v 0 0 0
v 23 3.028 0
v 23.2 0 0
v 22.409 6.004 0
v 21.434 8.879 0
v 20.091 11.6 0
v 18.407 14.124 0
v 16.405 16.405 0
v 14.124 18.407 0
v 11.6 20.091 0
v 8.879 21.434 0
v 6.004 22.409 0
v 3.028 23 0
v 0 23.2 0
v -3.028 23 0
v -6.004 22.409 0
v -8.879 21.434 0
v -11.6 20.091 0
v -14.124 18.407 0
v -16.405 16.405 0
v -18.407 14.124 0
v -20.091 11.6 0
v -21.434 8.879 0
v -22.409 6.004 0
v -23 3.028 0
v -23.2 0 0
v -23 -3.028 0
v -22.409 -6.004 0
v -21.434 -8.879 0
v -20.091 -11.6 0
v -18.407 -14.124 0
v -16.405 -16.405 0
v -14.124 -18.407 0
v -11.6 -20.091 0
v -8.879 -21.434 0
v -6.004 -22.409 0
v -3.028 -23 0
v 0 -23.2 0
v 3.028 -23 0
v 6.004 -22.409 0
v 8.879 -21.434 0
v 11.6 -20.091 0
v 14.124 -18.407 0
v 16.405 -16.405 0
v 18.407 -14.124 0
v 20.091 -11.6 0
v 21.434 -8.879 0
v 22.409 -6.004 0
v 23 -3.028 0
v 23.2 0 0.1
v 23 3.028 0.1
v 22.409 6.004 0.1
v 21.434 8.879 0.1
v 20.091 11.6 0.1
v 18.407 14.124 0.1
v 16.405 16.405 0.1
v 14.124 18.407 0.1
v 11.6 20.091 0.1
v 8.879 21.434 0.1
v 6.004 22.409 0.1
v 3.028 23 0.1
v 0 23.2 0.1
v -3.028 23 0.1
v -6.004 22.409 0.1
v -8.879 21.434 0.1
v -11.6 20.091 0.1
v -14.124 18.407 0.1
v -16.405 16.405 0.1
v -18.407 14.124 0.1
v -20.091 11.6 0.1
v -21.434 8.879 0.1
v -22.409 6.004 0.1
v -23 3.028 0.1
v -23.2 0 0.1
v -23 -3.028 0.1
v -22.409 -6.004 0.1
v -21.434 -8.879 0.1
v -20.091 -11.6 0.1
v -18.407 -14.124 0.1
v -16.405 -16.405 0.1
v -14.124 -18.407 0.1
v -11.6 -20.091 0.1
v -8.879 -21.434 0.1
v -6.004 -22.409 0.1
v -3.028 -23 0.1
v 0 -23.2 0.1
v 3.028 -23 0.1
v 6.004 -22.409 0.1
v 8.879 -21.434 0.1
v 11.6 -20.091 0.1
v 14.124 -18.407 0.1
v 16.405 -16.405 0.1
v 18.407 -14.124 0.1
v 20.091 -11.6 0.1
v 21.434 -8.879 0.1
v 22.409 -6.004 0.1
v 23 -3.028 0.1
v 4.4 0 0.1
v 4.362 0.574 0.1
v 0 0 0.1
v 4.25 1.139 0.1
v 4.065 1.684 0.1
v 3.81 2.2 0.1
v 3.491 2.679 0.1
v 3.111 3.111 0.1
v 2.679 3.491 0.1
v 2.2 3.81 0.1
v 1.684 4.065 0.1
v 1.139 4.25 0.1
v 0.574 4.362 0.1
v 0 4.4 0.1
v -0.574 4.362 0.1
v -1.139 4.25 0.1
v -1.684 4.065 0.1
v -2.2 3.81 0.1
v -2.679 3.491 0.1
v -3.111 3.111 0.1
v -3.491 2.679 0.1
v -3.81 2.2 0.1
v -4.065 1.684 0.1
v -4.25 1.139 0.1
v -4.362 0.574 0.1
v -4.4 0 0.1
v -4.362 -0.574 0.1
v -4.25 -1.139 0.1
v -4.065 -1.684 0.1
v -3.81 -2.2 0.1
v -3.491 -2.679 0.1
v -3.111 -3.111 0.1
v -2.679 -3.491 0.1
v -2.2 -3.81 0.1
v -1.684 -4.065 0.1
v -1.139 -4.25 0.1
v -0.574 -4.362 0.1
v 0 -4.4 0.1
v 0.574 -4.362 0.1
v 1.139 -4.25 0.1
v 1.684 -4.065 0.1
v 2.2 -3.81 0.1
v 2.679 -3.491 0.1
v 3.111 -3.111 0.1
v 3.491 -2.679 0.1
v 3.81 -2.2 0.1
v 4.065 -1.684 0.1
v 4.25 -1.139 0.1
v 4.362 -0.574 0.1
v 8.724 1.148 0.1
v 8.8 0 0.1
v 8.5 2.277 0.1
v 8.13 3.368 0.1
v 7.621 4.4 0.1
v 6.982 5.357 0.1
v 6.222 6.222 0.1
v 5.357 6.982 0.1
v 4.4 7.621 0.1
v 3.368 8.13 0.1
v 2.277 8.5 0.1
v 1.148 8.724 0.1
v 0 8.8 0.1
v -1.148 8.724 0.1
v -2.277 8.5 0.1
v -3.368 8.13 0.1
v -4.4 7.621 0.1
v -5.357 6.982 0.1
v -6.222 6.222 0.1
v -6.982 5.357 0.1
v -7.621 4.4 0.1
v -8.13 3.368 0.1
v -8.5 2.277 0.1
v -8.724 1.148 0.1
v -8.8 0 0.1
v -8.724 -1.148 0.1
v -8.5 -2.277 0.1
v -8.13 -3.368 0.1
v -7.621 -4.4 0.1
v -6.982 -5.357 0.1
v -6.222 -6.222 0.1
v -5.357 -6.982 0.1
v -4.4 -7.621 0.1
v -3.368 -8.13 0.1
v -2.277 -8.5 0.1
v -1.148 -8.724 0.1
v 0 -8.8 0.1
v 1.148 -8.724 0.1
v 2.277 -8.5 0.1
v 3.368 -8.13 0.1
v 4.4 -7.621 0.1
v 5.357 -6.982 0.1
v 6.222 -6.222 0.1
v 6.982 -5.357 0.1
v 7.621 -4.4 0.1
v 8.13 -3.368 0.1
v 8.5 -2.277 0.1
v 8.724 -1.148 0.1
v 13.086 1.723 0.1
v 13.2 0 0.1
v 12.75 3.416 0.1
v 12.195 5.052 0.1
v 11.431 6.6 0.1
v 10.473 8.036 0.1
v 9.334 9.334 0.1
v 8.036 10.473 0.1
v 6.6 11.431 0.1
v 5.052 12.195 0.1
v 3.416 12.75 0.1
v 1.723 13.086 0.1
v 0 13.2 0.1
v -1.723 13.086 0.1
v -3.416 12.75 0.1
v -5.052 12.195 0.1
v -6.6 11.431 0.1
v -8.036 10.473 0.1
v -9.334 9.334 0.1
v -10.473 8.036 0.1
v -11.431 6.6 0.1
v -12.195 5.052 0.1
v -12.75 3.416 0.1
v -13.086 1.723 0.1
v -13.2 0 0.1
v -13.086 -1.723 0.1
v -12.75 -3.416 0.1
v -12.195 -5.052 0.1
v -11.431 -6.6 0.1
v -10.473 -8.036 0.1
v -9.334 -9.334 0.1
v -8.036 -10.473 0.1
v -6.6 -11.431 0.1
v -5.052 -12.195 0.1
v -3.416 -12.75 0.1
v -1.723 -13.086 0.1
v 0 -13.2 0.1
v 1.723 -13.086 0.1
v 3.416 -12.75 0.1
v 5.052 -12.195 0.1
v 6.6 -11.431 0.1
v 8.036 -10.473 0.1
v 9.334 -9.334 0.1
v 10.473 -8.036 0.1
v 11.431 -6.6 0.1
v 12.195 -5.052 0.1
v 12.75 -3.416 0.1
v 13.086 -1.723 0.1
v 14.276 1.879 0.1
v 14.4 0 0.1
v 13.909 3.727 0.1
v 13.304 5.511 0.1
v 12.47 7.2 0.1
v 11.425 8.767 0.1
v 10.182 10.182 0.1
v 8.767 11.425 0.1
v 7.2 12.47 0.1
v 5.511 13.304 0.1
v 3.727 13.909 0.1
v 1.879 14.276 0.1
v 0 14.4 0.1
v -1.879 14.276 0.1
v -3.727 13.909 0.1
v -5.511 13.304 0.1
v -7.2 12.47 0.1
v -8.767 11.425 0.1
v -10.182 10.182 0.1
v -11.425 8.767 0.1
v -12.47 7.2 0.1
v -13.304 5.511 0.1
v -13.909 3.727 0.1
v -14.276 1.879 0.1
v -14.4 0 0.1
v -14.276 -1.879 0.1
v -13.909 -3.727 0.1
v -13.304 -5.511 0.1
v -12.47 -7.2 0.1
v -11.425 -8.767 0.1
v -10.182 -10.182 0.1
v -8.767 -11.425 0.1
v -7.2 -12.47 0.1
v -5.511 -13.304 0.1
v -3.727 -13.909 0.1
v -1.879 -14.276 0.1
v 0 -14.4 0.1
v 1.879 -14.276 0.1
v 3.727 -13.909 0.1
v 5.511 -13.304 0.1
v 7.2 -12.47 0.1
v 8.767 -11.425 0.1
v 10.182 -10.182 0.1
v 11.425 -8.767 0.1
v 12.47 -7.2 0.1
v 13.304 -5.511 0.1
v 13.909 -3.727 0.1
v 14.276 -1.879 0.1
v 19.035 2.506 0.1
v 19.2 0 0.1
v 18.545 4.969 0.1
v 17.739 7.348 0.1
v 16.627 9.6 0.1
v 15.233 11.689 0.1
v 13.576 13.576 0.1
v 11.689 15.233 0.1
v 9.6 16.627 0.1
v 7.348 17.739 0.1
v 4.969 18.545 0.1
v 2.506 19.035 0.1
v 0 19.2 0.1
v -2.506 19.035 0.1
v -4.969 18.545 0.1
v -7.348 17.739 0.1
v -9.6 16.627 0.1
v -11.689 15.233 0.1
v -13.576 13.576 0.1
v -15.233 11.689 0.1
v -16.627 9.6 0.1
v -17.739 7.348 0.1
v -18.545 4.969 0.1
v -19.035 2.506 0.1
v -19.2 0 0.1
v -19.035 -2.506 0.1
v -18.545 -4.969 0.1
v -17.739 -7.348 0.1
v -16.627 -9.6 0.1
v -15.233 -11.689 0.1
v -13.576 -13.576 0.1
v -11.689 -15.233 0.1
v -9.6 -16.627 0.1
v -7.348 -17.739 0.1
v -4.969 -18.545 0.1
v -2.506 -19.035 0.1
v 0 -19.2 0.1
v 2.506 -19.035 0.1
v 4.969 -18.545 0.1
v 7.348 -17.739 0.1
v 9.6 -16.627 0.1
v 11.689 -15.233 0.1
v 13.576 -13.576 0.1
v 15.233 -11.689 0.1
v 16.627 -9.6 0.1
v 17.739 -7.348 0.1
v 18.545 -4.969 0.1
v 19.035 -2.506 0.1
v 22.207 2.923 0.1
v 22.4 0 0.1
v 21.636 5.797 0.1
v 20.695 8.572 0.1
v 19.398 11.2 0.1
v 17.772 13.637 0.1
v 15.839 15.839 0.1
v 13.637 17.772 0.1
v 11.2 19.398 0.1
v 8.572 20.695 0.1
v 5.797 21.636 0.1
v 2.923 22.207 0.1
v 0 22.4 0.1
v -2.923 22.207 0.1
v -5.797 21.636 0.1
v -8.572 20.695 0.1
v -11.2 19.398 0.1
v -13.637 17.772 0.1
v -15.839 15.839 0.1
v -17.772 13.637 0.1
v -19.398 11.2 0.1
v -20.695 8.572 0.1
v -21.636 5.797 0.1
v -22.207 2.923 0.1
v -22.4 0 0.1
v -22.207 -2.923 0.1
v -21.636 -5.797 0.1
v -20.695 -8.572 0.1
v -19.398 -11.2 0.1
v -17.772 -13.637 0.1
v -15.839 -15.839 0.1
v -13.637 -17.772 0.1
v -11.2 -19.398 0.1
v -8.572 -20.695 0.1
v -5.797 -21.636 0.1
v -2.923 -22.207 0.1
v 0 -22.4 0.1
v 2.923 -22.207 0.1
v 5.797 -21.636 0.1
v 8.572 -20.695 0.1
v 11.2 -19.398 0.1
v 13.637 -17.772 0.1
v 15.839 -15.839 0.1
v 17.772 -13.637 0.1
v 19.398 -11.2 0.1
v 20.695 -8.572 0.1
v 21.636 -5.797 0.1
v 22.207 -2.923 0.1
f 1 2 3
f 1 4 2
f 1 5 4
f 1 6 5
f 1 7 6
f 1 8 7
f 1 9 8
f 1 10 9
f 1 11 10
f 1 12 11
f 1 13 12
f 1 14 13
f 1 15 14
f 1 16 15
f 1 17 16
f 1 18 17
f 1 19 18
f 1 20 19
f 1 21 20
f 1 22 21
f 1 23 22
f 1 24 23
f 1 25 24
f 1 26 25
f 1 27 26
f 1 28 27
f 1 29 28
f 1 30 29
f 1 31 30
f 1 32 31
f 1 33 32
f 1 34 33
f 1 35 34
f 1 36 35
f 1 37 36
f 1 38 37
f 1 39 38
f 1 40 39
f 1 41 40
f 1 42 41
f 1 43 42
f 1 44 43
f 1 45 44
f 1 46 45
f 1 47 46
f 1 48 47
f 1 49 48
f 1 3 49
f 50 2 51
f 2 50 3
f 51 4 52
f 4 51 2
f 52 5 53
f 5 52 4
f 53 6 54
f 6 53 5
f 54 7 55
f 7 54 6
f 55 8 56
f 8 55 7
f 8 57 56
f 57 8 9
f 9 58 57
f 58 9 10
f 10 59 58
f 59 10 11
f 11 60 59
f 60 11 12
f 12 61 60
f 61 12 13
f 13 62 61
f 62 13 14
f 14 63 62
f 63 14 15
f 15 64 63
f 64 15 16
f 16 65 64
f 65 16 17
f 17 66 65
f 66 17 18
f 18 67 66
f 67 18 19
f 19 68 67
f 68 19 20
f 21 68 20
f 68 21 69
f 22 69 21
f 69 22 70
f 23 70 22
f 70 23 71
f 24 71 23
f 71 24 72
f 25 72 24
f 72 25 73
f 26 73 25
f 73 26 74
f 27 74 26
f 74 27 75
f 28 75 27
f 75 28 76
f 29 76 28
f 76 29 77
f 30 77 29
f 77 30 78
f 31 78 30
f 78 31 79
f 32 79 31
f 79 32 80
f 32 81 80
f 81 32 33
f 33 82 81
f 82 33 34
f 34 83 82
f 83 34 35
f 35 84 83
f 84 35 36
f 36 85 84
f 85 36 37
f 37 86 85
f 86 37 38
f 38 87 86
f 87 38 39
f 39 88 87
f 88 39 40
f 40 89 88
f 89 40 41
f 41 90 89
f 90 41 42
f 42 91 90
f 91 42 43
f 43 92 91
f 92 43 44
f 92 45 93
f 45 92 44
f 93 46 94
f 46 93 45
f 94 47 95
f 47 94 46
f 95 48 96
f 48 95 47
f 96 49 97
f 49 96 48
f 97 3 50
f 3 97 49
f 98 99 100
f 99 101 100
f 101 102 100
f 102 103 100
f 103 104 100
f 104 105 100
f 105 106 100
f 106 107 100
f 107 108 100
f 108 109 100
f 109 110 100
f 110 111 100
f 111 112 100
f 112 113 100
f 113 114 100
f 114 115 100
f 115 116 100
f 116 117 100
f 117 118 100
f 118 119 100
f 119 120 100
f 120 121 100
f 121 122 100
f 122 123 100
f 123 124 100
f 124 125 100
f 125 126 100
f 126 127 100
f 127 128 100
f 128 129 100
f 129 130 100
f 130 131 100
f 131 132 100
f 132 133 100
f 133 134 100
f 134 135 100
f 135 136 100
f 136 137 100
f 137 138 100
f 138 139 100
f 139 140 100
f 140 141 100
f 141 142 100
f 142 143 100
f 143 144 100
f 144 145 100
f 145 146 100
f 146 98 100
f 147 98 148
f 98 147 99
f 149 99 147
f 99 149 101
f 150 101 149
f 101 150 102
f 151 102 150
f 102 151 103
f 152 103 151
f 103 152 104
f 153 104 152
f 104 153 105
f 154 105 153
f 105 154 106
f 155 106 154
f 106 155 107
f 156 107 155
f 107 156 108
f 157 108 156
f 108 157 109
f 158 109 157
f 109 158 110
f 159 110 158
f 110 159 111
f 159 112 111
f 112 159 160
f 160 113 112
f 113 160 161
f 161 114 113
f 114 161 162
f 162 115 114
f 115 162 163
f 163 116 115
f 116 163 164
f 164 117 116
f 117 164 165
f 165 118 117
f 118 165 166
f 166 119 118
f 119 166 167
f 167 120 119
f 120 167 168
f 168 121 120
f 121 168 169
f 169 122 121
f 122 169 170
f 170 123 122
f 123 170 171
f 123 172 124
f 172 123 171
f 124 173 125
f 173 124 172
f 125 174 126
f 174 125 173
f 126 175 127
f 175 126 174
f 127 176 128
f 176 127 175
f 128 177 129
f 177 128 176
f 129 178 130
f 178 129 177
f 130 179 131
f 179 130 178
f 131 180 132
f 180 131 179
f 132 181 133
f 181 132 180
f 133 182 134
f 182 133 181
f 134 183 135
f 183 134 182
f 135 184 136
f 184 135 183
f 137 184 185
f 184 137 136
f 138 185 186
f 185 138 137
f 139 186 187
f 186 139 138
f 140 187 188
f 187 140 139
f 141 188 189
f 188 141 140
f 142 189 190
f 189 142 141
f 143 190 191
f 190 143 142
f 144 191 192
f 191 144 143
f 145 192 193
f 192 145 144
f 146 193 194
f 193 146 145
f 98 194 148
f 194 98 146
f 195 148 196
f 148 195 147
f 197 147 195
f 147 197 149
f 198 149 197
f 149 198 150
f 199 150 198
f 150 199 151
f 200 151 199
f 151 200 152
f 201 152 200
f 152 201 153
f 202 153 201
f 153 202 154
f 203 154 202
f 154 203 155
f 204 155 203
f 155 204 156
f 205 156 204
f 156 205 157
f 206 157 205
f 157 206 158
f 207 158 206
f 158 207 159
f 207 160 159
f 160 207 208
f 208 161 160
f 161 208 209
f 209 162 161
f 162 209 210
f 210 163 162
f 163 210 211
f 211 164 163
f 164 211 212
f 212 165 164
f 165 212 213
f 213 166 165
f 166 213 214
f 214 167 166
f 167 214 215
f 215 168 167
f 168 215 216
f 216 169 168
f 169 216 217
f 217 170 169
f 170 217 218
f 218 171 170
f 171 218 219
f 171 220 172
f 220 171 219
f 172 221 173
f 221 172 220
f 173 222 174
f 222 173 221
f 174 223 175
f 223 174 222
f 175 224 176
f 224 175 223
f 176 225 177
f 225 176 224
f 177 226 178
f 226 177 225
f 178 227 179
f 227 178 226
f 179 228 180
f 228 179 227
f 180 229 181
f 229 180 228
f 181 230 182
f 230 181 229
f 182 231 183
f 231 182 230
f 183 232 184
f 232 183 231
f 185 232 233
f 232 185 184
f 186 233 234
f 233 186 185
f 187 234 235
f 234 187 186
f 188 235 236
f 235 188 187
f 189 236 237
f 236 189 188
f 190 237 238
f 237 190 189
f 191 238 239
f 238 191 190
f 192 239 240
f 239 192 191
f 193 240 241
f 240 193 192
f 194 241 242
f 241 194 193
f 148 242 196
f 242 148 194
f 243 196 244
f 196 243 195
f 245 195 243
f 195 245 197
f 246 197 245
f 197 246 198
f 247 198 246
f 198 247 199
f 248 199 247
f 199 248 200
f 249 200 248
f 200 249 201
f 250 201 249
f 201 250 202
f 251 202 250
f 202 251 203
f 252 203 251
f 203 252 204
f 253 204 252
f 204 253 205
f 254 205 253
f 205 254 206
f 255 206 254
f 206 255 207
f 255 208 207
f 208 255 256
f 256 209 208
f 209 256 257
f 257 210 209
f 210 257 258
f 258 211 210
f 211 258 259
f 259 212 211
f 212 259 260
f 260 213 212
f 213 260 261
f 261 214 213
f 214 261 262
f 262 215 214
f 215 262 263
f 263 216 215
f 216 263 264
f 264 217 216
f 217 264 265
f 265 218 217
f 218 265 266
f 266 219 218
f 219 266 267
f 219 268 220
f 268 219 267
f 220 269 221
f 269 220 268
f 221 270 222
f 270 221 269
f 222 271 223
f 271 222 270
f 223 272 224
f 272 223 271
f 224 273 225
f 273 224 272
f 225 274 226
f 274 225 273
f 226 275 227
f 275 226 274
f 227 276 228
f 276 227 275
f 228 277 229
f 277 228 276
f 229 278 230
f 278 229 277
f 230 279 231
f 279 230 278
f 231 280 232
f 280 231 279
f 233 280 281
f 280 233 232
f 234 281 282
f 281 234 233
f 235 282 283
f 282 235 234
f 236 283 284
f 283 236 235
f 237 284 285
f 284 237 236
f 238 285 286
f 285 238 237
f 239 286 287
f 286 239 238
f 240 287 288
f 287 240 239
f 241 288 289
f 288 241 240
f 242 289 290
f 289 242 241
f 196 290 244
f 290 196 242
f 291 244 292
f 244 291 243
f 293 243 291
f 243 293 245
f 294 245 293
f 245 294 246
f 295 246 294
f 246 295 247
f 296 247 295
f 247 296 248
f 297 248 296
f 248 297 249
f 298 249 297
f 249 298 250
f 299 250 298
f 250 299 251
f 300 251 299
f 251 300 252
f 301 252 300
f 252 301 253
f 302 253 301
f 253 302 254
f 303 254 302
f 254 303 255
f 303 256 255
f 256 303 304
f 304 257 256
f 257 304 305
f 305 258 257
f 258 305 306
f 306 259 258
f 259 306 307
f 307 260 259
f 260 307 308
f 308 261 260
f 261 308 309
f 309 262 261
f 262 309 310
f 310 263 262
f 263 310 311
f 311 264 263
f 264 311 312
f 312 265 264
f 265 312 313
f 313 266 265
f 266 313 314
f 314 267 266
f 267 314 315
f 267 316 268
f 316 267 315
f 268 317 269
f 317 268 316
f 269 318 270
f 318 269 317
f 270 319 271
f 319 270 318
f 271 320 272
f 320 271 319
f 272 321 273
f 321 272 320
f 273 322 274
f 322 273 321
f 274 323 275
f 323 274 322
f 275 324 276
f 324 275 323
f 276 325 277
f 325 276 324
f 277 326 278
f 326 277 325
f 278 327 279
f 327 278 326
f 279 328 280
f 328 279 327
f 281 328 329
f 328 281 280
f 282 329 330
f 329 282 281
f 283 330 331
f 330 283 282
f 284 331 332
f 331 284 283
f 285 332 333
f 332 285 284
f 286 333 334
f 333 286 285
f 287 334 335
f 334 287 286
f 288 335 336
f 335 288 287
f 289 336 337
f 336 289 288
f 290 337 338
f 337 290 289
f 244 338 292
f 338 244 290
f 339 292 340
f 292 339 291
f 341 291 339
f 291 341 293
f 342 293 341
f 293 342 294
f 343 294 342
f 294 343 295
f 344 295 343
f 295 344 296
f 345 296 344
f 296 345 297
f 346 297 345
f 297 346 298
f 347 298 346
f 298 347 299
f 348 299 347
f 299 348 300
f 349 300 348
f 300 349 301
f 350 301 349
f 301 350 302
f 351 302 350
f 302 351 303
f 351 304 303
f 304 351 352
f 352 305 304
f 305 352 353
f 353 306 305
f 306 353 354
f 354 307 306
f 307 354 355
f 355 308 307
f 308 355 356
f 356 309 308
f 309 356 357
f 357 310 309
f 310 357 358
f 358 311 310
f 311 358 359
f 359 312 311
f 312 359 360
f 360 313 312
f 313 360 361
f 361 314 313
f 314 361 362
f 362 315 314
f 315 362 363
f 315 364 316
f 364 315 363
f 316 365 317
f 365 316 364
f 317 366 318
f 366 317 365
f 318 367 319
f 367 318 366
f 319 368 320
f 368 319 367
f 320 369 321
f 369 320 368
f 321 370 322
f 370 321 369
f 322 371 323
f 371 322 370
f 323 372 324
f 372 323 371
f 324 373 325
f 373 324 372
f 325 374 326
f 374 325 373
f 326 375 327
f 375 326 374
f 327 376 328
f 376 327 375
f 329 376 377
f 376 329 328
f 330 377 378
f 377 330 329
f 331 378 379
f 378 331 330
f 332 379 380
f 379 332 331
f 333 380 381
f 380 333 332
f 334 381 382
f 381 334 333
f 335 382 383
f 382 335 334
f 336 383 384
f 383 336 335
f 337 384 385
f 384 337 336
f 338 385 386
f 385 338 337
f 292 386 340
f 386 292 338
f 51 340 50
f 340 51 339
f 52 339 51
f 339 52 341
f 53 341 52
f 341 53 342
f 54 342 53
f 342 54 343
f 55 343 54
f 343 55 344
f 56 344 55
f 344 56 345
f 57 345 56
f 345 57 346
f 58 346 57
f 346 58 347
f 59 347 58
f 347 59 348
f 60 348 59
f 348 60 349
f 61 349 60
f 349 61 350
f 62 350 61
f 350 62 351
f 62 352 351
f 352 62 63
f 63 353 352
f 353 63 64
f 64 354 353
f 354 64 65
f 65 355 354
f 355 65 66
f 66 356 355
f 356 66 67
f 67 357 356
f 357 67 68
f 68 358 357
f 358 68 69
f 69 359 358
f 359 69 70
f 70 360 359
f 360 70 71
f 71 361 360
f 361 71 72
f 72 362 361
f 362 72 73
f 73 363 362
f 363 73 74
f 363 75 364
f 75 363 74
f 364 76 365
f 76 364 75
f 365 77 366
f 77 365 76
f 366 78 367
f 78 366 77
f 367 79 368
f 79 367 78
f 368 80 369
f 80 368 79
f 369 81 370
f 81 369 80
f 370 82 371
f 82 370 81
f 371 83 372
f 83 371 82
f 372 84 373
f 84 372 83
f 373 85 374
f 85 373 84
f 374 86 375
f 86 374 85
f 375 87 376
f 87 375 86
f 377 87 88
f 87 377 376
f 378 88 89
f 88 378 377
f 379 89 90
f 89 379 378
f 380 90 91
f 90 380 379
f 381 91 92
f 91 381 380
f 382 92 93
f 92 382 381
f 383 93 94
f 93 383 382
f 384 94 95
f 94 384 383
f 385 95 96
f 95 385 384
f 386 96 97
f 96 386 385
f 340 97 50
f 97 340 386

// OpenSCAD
use <../lib.scad>
use <../p/48/4-4cylc3.scad>
use <../p/48/4-4disc.scad>
use <../p/48/4-4ring1.scad>
use <../p/48/4-4ring11.scad>
use <../p/48/4-4ring2.scad>
use <../p/48/4-4ring28.scad>
use <../p/48/4-4ring3.scad>
use <../p/48/4-4ring6.scad>
function ldraw_lib__6005745a() = [
// 0 Sticker  5.8 x  5.8 Round with Red/White/DarkBlue Concentric Rings
// 0 Name: 6005745a.dat
// 0 Author: J.C. Tchang [tchang]
// 0 !LDRAW_ORG Part UPDATE 2024-02
// 0 !LICENSE Licensed under CC BY 4.0 : see CAreadme.txt
// 
// 0 BFC CERTIFY CCW
  [0,"BFC","CERTIFY"],
  [0,"BFC","CCW"],
// 
// 0 !KEYWORDS RAF, Roundel, Royal Air Force, Set 10226, Sopwith Camel
// 
// 0 !HISTORY 2013-12-23 [PTadmin] Official Update 2013-02
// 0 !HISTORY 2017-07-03 [cwdee] Use cylinder primitive with conditional lines
// 0 !HISTORY 2017-12-30 [PTadmin] Official Update 2017-01
// 0 !HISTORY 2024-03-23 [OrionP] Updated ring primitives
// 0 !HISTORY 2024-03-24 [OrionP] Official Update 2024-02
// 
// 1 16 0 0 0 58 0 0 0 -0.25 0 0 0 58 48\4-4cylc3.dat
  [1,16,0,0,0,58,0,0,0,-0.25,0,0,0,58, ldraw_lib__48__4_4cylc3()],
// 
// 1 4 0 -0.25 0 11 0 0 0 1 0 0 0 11 48\4-4disc.dat
  [1,4,0,-0.25,0,11,0,0,0,1,0,0,0,11, ldraw_lib__48__4_4disc()],
// 1 15 0 -0.25 0 11 0 0 0 1 0 0 0 11 48\4-4ring1.dat
  [1,15,0,-0.25,0,11,0,0,0,1,0,0,0,11, ldraw_lib__48__4_4ring1()],
// 1 15 0 -0.25 0 11 0 0 0 1 0 0 0 11 48\4-4ring2.dat
  [1,15,0,-0.25,0,11,0,0,0,1,0,0,0,11, ldraw_lib__48__4_4ring2()],
// 1 15 0 -0.25 0 3 0 0 0 1 0 0 0 3 48\4-4ring11.dat
  [1,15,0,-0.25,0,3,0,0,0,1,0,0,0,3, ldraw_lib__48__4_4ring11()],
// 1 1 0 -0.25 0 12 0 0 0 1 0 0 0 12 48\4-4ring3.dat
  [1,1,0,-0.25,0,12,0,0,0,1,0,0,0,12, ldraw_lib__48__4_4ring3()],
// 1 1 0 -0.25 0 8 0 0 0 1 0 0 0 8 48\4-4ring6.dat
  [1,1,0,-0.25,0,8,0,0,0,1,0,0,0,8, ldraw_lib__48__4_4ring6()],
// 1 15 0 -0.25 0 2 0 0 0 1 0 0 0 2 48\4-4ring28.dat
  [1,15,0,-0.25,0,2,0,0,0,1,0,0,0,2, ldraw_lib__48__4_4ring28()],
];
module ldraw_lib__6005745a(step=0, col=false, unit=2/5, alt=false, line=0.2, solid=!$preview)
    makepoly(ldraw_lib__6005745a(), step=step, col=col, unit=unit, alt=alt, line=line, solid=solid);
ldraw_lib__6005745a(line=0.2);
